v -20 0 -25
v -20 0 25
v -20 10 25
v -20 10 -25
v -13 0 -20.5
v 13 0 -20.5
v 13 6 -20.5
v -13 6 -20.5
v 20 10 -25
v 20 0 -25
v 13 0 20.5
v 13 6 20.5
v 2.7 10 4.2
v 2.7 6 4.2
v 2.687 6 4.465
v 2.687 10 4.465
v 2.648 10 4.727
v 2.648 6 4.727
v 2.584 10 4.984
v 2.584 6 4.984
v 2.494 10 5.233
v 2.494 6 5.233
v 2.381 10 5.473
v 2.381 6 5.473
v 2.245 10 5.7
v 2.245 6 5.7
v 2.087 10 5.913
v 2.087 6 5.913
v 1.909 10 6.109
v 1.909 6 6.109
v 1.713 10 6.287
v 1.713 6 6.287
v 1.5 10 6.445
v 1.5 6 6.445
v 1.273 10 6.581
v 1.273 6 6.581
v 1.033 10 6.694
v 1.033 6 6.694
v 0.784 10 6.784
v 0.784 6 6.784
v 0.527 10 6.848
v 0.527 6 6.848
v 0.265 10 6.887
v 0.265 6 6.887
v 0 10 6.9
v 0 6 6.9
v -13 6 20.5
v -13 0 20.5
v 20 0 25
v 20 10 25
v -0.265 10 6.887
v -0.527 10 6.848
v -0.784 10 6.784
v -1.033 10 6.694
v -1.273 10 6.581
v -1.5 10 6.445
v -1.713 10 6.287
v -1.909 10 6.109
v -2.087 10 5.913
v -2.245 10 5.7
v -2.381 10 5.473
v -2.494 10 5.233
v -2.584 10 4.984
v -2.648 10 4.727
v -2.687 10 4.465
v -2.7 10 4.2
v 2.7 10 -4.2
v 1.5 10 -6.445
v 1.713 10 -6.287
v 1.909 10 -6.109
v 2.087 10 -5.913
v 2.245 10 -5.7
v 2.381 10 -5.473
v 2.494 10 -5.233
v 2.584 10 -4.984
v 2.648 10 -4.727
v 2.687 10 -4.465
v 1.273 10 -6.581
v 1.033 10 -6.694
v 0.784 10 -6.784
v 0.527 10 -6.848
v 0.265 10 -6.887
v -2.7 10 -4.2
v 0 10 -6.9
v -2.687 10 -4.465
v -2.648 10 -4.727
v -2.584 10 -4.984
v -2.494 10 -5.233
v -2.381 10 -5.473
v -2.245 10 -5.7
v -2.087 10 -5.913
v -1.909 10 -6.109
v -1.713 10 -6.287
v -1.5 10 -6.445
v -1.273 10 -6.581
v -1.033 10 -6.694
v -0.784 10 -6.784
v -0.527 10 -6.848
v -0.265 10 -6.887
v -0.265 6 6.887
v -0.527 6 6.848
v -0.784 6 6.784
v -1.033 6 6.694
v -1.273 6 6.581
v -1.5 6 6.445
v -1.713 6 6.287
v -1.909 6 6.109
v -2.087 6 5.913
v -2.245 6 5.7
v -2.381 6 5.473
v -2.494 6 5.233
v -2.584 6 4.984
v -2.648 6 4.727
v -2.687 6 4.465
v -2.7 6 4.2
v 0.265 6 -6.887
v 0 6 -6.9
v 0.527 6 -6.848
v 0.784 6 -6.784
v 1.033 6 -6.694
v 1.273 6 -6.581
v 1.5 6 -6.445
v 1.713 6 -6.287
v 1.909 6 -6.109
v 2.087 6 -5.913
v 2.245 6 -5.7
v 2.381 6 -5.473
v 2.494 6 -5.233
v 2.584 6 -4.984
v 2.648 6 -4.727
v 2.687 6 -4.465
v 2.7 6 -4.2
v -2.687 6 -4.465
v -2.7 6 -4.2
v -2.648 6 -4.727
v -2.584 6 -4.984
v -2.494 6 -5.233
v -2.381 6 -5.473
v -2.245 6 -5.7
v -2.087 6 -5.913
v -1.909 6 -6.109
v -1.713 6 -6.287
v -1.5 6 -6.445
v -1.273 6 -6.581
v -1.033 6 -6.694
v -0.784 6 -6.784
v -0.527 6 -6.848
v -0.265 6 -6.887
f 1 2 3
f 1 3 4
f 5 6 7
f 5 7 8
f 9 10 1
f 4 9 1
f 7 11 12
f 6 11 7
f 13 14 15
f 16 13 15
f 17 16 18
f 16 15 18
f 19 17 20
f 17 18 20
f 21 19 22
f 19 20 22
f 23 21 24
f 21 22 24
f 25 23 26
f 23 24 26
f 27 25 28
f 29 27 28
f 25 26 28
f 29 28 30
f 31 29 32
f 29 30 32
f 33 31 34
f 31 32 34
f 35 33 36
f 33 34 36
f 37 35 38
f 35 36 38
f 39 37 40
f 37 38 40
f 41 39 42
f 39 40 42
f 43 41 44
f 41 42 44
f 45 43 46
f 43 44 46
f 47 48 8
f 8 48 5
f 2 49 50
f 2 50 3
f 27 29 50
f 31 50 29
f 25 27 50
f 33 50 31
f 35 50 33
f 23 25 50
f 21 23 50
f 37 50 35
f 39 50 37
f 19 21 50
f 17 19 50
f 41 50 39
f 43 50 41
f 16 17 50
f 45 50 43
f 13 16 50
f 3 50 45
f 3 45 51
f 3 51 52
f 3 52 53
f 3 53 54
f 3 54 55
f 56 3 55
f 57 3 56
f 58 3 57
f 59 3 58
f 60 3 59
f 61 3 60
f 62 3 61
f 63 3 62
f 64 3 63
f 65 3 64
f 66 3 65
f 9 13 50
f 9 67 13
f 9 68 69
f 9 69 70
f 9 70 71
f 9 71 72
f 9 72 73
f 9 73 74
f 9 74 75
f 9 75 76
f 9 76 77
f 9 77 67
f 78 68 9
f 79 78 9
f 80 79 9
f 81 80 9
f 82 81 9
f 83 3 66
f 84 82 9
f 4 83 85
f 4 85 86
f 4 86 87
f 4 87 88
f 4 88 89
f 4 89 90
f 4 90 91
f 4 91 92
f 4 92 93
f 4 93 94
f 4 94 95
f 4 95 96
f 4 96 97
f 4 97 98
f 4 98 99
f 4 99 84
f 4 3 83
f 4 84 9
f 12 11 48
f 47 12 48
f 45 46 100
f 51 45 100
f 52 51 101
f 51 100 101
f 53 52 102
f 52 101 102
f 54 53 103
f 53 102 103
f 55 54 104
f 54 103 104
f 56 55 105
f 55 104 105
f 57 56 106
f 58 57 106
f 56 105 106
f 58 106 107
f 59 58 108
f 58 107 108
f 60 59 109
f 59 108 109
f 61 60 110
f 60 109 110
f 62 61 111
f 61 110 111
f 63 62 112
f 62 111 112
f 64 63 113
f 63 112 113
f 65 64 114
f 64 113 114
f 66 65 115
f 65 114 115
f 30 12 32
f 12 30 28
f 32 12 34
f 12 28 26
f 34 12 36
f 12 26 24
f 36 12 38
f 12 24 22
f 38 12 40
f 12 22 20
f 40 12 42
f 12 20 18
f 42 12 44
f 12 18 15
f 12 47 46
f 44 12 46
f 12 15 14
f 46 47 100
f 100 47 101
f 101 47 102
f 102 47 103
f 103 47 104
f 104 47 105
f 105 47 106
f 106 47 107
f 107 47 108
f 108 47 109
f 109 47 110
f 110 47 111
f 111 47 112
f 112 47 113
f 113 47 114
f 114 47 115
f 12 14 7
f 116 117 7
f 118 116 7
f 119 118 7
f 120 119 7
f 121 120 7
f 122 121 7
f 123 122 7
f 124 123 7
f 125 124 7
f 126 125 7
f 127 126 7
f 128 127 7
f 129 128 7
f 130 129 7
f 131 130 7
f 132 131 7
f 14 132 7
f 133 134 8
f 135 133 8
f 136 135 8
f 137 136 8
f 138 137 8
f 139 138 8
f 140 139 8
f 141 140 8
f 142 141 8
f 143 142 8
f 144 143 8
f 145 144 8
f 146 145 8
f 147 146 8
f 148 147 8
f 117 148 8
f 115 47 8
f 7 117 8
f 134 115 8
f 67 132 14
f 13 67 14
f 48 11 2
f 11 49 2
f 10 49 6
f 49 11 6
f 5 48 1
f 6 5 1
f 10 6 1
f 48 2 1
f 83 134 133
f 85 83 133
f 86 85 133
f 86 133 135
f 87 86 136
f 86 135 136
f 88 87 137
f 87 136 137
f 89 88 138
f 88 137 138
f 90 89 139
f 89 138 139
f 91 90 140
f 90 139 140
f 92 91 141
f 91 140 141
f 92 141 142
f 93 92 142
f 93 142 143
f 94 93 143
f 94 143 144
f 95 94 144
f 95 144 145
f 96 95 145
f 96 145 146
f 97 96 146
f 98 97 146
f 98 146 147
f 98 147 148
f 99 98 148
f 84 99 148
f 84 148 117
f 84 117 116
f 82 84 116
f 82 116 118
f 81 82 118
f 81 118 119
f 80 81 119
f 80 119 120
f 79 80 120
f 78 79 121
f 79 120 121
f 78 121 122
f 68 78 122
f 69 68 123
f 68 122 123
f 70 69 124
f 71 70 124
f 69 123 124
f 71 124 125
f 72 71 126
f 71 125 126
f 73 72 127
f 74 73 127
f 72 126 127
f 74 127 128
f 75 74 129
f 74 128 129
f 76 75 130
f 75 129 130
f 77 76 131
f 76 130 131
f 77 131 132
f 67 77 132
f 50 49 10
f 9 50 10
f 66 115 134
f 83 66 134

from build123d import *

# Parameters (mm, degrees)
SKETCH_1_W          = 50
SKETCH_1_H          = 40
EXTRUDE_1_DEPTH     = 10
CUT_EXTRUDE_START   = -10
SKETCH_7_W          = 41
SKETCH_7_H          = 26
CUT_EXTRUDE_2_DEPTH = 6
CUT_EXTRUDE_3_DEPTH = 33.57299495


with BuildPart() as part:
    # 草图1 → 凸台-拉伸1 (new body)
    with BuildSketch(Plane(origin=(0, 0, 0), x_dir=(0, 0, -1), z_dir=(0, 1, 0))):
        Rectangle(SKETCH_1_W, SKETCH_1_H)
    extrude(amount=EXTRUDE_1_DEPTH)

    # 草图7 → 切除-拉伸2 (cut)
    with BuildSketch(Plane(origin=(0, 10, 0), x_dir=(0, 0, -1), z_dir=(0, 1, 0)).offset(CUT_EXTRUDE_START)):
        Rectangle(SKETCH_7_W, SKETCH_7_H)
    extrude(amount=CUT_EXTRUDE_2_DEPTH, mode=Mode.SUBTRACT)

    # 草图8 → 切除-拉伸3 (cut, through all)
    with BuildSketch(Plane(origin=(0, 6, 0), x_dir=(0, 0, 1), z_dir=(0, -1, 0))):
        with BuildLine():
            ThreePointArc((-1.5, 0), (-2.290811691, 1.909188309), (-4.2, 2.7))
            Line((-4.2, 2.7), (-4.2, -2.7))
            ThreePointArc((-4.2, -2.7), (-2.290811691, -1.909188309), (-1.5, 0))
        make_face()
        with BuildLine():
            Line((-4.2, -2.7), (-4.2, 2.7))
            ThreePointArc((-4.2, 2.7), (-6.9, 0), (-4.2, -2.7))
        make_face()
        with BuildLine():
            Line((4.2, 2.7), (-4.2, 2.7))
            ThreePointArc((-4.2, 2.7), (-2.290811691, 1.909188309), (-1.5, 0))
            ThreePointArc((-1.5, 0), (-2.290811691, -1.909188309), (-4.2, -2.7))
            Line((-4.2, -2.7), (4.2, -2.7))
            ThreePointArc((4.2, -2.7), (1.5, 0), (4.2, 2.7))
        make_face()
        with BuildLine():
            ThreePointArc((6.9, 0), (6.109188309, 1.909188309), (4.2, 2.7))
            Line((4.2, 2.7), (4.2, -2.7))
            ThreePointArc((4.2, -2.7), (6.109188309, -1.909188309), (6.9, 0))
        make_face()
        with BuildLine():
            Line((4.2, -2.7), (4.2, 2.7))
            ThreePointArc((4.2, 2.7), (1.5, 0), (4.2, -2.7))
        make_face()
    extrude(amount=-CUT_EXTRUDE_3_DEPTH, mode=Mode.SUBTRACT)


solid = part.part
